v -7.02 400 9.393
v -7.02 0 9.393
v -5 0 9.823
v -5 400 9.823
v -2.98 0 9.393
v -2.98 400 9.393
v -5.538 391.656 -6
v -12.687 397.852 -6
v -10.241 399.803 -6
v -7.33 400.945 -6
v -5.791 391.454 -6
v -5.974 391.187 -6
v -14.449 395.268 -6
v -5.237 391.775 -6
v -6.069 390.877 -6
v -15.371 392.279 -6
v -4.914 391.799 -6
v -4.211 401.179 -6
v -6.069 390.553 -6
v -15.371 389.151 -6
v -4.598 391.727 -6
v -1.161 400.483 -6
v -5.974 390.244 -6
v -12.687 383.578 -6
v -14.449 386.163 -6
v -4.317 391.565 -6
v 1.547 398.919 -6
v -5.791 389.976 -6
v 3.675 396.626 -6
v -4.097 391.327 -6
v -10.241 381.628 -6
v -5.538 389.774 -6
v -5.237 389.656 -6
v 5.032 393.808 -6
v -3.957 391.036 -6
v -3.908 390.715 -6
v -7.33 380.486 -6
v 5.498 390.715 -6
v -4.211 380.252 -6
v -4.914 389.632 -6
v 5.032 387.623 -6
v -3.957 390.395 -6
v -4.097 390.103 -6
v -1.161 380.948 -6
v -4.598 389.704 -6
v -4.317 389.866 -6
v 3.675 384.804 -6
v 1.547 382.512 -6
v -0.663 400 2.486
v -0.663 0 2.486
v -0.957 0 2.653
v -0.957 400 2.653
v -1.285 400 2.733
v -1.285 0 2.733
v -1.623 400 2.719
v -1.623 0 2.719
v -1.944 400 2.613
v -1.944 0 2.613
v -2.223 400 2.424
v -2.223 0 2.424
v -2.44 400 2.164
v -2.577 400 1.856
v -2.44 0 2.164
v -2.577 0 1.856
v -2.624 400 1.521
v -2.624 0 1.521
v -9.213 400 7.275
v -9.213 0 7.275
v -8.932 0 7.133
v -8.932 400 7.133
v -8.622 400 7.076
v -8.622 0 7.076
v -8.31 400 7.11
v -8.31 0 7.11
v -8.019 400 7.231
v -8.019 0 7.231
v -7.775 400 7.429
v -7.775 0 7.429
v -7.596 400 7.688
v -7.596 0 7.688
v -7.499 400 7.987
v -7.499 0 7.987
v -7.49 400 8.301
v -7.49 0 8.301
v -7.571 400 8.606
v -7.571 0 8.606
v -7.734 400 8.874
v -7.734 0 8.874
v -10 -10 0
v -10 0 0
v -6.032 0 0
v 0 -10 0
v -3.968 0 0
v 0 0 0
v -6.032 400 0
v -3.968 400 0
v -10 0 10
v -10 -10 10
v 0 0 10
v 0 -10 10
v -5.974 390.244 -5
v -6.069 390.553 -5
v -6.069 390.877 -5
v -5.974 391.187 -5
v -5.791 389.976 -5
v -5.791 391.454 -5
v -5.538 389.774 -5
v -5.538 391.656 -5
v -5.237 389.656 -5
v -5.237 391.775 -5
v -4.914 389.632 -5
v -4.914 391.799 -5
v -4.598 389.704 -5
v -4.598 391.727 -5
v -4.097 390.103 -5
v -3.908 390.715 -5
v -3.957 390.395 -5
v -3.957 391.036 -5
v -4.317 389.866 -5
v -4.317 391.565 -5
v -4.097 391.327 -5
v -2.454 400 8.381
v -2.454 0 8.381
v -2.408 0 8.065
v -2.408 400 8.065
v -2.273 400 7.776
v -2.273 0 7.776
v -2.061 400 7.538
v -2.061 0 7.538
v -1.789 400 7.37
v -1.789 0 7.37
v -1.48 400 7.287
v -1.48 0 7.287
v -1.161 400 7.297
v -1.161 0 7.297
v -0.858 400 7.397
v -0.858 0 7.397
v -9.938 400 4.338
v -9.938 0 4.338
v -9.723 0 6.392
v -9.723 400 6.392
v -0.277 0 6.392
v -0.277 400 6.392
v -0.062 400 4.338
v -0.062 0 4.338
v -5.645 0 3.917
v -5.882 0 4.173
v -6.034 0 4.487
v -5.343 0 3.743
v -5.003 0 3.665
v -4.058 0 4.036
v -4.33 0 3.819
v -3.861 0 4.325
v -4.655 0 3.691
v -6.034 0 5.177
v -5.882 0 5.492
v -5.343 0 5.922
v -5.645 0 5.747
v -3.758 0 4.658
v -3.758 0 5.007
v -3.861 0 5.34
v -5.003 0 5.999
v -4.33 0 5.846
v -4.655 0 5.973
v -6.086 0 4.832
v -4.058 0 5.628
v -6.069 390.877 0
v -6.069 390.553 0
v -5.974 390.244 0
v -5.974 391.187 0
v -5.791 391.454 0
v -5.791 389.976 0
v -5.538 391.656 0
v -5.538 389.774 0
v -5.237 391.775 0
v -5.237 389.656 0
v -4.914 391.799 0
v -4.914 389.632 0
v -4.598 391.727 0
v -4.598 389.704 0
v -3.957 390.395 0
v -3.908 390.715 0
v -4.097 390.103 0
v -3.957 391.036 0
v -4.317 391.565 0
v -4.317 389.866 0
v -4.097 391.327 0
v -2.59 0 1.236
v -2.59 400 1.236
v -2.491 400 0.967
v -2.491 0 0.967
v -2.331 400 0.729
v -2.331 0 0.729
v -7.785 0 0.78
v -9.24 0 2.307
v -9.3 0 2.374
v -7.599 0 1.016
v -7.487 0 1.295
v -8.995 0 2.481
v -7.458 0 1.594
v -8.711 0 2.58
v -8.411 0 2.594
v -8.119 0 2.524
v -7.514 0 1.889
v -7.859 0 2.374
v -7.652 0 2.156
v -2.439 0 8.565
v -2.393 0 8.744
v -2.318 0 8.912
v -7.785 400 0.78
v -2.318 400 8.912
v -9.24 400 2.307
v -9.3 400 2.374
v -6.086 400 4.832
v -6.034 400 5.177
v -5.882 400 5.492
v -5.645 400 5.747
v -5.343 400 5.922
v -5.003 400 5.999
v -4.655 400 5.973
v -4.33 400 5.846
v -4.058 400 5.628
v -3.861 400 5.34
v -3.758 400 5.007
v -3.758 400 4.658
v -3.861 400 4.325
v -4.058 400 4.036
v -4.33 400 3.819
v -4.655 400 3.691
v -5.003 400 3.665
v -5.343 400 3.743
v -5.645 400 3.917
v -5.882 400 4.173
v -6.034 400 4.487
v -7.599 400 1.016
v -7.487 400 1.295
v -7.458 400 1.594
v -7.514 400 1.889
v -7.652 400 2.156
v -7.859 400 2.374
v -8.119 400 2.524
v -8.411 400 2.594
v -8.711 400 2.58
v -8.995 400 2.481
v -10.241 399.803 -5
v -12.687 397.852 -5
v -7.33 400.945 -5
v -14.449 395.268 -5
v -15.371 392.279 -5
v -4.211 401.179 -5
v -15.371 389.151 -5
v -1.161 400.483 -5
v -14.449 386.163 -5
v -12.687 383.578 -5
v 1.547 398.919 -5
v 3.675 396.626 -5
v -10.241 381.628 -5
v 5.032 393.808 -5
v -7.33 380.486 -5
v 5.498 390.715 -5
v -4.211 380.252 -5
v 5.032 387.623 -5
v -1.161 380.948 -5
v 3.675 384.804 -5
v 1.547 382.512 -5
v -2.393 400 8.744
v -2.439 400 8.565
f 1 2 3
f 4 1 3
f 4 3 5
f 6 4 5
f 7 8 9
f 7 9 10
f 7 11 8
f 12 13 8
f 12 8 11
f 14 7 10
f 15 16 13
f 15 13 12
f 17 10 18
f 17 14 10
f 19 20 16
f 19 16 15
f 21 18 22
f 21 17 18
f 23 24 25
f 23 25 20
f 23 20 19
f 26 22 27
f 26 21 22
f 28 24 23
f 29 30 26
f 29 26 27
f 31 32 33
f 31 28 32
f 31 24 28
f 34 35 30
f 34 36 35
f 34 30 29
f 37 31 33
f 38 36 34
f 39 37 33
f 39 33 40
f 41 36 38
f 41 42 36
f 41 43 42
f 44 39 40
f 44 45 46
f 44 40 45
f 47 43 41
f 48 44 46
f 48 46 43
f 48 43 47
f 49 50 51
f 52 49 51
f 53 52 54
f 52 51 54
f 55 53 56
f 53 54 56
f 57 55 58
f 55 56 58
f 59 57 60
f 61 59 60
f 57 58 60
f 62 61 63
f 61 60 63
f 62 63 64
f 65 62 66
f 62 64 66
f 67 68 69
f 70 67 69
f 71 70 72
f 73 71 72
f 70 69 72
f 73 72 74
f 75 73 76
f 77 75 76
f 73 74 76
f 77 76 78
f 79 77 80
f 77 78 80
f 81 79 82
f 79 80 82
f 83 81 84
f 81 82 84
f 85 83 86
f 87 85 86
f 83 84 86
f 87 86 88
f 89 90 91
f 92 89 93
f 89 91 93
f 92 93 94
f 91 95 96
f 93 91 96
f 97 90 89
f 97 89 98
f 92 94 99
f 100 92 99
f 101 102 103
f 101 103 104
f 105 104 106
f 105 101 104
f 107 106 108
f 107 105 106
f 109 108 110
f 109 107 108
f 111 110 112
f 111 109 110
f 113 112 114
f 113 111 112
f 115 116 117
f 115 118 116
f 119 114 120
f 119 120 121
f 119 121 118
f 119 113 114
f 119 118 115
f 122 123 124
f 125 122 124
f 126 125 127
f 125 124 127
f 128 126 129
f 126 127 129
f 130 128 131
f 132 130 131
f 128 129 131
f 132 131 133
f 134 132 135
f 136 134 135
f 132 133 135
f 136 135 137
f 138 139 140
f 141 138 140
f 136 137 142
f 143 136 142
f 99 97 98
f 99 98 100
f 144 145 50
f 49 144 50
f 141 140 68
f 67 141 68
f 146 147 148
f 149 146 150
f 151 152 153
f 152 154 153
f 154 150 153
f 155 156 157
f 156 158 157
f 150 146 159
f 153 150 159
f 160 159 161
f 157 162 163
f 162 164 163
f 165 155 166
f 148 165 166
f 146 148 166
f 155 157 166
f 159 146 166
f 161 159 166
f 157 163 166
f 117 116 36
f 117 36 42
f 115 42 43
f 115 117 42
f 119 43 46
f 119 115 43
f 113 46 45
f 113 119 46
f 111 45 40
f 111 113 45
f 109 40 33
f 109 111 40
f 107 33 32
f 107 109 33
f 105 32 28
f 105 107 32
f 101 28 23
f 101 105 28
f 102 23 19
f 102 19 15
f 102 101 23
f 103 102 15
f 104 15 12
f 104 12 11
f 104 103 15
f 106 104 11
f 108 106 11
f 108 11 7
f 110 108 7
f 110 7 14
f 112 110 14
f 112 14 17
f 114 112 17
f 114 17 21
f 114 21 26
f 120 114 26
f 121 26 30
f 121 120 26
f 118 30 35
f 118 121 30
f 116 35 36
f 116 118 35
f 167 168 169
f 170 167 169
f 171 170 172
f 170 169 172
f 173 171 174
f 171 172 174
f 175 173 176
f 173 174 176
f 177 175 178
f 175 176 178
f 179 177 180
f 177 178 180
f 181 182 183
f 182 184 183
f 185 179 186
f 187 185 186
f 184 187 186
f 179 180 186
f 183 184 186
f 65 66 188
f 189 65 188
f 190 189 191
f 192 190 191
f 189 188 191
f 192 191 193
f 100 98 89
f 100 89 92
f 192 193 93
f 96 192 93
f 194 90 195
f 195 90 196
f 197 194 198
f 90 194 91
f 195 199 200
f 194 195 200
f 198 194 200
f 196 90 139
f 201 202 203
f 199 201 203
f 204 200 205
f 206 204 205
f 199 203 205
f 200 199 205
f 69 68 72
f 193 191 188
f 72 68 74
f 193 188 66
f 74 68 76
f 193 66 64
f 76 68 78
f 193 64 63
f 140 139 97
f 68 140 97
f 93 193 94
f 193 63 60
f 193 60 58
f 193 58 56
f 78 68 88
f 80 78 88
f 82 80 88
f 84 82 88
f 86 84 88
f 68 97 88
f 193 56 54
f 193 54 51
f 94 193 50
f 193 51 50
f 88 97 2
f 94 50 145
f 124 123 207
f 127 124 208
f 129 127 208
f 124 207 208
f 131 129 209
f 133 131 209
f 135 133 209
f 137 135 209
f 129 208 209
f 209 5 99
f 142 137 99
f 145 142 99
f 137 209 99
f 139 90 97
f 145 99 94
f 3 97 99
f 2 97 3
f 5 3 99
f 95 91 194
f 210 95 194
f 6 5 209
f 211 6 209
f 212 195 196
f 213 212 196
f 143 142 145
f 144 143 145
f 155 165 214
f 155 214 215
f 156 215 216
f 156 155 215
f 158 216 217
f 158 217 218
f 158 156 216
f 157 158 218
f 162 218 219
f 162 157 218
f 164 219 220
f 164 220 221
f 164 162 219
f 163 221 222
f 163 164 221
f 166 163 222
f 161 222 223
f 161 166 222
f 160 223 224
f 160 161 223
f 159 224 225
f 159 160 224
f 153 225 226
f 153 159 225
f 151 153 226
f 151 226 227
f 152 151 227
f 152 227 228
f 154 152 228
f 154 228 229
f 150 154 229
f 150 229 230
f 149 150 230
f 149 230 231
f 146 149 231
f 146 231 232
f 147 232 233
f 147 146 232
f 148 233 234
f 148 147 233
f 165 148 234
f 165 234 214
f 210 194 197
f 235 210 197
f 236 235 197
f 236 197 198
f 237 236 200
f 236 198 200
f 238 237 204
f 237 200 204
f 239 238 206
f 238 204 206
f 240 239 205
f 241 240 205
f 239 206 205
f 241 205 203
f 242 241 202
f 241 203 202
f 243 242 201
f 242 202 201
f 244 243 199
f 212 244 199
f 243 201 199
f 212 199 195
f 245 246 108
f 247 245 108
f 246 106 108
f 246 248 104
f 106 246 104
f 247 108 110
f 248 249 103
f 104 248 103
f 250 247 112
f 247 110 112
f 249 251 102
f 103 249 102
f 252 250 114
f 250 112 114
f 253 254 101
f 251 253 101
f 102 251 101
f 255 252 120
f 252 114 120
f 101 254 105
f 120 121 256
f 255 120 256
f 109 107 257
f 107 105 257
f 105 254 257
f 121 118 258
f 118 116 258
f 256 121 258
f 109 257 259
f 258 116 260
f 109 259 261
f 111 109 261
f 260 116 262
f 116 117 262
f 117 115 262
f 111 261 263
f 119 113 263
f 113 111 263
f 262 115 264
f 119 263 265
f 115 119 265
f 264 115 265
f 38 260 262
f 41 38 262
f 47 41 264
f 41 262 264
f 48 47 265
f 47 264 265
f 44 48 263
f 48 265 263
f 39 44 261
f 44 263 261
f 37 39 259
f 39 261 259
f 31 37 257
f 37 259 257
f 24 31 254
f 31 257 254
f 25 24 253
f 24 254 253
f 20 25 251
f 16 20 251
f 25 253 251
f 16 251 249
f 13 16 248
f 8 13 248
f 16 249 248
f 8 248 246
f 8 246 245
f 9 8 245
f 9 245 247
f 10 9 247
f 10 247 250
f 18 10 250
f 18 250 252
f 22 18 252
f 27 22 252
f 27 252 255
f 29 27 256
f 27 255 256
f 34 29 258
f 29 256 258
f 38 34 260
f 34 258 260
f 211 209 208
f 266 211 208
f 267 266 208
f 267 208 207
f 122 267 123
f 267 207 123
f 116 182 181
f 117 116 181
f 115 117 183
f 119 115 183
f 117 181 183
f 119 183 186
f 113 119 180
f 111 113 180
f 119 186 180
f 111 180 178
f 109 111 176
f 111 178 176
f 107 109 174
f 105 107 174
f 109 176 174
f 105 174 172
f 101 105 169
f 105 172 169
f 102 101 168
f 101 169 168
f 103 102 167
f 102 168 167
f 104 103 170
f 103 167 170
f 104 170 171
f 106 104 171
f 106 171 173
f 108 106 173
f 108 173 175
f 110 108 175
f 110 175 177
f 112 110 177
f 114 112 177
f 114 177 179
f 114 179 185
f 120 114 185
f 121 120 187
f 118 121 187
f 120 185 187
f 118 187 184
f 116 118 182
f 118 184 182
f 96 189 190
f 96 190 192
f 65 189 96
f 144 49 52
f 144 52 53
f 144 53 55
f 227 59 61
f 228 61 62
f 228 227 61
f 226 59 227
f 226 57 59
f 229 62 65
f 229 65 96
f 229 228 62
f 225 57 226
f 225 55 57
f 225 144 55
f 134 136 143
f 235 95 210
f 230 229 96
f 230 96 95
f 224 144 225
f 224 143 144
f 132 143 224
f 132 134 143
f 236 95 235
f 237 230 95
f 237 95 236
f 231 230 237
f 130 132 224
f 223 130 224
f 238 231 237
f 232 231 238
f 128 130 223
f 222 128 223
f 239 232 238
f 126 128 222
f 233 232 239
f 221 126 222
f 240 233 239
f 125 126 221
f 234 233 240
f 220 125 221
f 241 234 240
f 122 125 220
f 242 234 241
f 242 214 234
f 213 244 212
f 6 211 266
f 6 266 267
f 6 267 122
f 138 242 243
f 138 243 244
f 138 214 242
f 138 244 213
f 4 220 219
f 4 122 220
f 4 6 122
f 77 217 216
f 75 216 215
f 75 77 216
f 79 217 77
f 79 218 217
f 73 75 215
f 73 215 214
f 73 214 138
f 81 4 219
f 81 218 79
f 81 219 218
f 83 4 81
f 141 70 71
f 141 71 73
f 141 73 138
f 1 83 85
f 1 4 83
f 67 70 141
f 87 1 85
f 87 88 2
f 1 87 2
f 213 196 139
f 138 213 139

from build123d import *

# Parameters (mm, degrees)
F0_W     = 10
F0_H     = 10
F1_DEPTH = 10
F3_R     = 1.170259
F4_DEPTH = 400
F6_R     = 1.086598
F7_DEPTH = 5
F8_R     = 10.492932
F8_R_2   = 1.086598
F9_DEPTH = 1


with BuildPart() as f1:
    # F0 (on Front) → F1 (new body)
    with BuildSketch(Plane.XZ):
        with Locations((-5, 5)):
            Rectangle(F0_W, F0_H)
    extrude(amount=F1_DEPTH)

    # F3 (on face) → F4 (join)
    with BuildSketch(Plane(origin=(0, 0, 0), x_dir=(-1, 0, 0), z_dir=(0, 1, 0))):
        with BuildLine():
            ThreePointArc((9.21269, 7.274635), (7.774734, 7.428781), (7.733978, 8.874401))
            Line((7.733978, 8.874401), (7.019686, 9.393365))
            Line((7.019686, 9.393365), (5, 9.822663))
            Line((5, 9.822663), (2.980314, 9.393365))
            Line((2.980314, 9.393365), (2.317867, 8.912069))
            ThreePointArc((2.317867, 8.912069), (2.419518, 8.655342), (2.454127, 8.3814))
            ThreePointArc((2.454127, 8.3814), (1.930787, 7.443841), (0.858067, 7.397191))
            Line((0.858067, 7.397191), (0.277447, 6.391527))
            Line((0.277447, 6.391527), (0.061616, 4.338031))
            Line((0.061616, 4.338031), (0.66345, 2.485776))
            ThreePointArc((0.66345, 2.485776), (1.943866, 2.613429), (2.6238, 1.520976))
            ThreePointArc((2.6238, 1.520976), (2.548207, 1.098639), (2.330814, 0.728743))
            Line((2.330814, 0.728743), (3.967597, 0))
            Line((3.967597, 0), (6.032403, 0))
            Line((6.032403, 0), (7.785355, 0.780464))
            ThreePointArc((7.785355, 0.780464), (7.747756, 2.272181), (9.239545, 2.306781))
            Line((9.239545, 2.306781), (9.300324, 2.374283))
            Line((9.300324, 2.374283), (9.938384, 4.338031))
            Line((9.938384, 4.338031), (9.722553, 6.391527))
            Line((9.722553, 6.391527), (9.21269, 7.274635))
        make_face()
        with Locations((4.915473, 4.83232)):
            Circle(F3_R, mode=Mode.SUBTRACT)
    extrude(amount=F4_DEPTH)


with BuildPart() as f7:
    # F6 (on face) → F7 (new body)
    with BuildSketch(Plane(origin=(0, 0, 0), x_dir=(1, 0, 0), z_dir=(0, 0, -1))):
        with Locations((-4.994886, -390.715361)):
            Circle(F6_R)
    extrude(amount=F7_DEPTH)


with BuildPart() as f9:
    # F8 (on face) → F9 (new body)
    with BuildSketch(Plane(origin=(0, 0, -5), x_dir=(1, 0, 0), z_dir=(0, 0, -1))):
        with Locations((-4.994886, -390.715361)):
            Circle(F8_R)
        with Locations((-4.994886, -390.715361)):
            Circle(F8_R_2, mode=Mode.SUBTRACT)
    extrude(amount=F9_DEPTH)


solid = Compound([f1.part, f7.part, f9.part])
